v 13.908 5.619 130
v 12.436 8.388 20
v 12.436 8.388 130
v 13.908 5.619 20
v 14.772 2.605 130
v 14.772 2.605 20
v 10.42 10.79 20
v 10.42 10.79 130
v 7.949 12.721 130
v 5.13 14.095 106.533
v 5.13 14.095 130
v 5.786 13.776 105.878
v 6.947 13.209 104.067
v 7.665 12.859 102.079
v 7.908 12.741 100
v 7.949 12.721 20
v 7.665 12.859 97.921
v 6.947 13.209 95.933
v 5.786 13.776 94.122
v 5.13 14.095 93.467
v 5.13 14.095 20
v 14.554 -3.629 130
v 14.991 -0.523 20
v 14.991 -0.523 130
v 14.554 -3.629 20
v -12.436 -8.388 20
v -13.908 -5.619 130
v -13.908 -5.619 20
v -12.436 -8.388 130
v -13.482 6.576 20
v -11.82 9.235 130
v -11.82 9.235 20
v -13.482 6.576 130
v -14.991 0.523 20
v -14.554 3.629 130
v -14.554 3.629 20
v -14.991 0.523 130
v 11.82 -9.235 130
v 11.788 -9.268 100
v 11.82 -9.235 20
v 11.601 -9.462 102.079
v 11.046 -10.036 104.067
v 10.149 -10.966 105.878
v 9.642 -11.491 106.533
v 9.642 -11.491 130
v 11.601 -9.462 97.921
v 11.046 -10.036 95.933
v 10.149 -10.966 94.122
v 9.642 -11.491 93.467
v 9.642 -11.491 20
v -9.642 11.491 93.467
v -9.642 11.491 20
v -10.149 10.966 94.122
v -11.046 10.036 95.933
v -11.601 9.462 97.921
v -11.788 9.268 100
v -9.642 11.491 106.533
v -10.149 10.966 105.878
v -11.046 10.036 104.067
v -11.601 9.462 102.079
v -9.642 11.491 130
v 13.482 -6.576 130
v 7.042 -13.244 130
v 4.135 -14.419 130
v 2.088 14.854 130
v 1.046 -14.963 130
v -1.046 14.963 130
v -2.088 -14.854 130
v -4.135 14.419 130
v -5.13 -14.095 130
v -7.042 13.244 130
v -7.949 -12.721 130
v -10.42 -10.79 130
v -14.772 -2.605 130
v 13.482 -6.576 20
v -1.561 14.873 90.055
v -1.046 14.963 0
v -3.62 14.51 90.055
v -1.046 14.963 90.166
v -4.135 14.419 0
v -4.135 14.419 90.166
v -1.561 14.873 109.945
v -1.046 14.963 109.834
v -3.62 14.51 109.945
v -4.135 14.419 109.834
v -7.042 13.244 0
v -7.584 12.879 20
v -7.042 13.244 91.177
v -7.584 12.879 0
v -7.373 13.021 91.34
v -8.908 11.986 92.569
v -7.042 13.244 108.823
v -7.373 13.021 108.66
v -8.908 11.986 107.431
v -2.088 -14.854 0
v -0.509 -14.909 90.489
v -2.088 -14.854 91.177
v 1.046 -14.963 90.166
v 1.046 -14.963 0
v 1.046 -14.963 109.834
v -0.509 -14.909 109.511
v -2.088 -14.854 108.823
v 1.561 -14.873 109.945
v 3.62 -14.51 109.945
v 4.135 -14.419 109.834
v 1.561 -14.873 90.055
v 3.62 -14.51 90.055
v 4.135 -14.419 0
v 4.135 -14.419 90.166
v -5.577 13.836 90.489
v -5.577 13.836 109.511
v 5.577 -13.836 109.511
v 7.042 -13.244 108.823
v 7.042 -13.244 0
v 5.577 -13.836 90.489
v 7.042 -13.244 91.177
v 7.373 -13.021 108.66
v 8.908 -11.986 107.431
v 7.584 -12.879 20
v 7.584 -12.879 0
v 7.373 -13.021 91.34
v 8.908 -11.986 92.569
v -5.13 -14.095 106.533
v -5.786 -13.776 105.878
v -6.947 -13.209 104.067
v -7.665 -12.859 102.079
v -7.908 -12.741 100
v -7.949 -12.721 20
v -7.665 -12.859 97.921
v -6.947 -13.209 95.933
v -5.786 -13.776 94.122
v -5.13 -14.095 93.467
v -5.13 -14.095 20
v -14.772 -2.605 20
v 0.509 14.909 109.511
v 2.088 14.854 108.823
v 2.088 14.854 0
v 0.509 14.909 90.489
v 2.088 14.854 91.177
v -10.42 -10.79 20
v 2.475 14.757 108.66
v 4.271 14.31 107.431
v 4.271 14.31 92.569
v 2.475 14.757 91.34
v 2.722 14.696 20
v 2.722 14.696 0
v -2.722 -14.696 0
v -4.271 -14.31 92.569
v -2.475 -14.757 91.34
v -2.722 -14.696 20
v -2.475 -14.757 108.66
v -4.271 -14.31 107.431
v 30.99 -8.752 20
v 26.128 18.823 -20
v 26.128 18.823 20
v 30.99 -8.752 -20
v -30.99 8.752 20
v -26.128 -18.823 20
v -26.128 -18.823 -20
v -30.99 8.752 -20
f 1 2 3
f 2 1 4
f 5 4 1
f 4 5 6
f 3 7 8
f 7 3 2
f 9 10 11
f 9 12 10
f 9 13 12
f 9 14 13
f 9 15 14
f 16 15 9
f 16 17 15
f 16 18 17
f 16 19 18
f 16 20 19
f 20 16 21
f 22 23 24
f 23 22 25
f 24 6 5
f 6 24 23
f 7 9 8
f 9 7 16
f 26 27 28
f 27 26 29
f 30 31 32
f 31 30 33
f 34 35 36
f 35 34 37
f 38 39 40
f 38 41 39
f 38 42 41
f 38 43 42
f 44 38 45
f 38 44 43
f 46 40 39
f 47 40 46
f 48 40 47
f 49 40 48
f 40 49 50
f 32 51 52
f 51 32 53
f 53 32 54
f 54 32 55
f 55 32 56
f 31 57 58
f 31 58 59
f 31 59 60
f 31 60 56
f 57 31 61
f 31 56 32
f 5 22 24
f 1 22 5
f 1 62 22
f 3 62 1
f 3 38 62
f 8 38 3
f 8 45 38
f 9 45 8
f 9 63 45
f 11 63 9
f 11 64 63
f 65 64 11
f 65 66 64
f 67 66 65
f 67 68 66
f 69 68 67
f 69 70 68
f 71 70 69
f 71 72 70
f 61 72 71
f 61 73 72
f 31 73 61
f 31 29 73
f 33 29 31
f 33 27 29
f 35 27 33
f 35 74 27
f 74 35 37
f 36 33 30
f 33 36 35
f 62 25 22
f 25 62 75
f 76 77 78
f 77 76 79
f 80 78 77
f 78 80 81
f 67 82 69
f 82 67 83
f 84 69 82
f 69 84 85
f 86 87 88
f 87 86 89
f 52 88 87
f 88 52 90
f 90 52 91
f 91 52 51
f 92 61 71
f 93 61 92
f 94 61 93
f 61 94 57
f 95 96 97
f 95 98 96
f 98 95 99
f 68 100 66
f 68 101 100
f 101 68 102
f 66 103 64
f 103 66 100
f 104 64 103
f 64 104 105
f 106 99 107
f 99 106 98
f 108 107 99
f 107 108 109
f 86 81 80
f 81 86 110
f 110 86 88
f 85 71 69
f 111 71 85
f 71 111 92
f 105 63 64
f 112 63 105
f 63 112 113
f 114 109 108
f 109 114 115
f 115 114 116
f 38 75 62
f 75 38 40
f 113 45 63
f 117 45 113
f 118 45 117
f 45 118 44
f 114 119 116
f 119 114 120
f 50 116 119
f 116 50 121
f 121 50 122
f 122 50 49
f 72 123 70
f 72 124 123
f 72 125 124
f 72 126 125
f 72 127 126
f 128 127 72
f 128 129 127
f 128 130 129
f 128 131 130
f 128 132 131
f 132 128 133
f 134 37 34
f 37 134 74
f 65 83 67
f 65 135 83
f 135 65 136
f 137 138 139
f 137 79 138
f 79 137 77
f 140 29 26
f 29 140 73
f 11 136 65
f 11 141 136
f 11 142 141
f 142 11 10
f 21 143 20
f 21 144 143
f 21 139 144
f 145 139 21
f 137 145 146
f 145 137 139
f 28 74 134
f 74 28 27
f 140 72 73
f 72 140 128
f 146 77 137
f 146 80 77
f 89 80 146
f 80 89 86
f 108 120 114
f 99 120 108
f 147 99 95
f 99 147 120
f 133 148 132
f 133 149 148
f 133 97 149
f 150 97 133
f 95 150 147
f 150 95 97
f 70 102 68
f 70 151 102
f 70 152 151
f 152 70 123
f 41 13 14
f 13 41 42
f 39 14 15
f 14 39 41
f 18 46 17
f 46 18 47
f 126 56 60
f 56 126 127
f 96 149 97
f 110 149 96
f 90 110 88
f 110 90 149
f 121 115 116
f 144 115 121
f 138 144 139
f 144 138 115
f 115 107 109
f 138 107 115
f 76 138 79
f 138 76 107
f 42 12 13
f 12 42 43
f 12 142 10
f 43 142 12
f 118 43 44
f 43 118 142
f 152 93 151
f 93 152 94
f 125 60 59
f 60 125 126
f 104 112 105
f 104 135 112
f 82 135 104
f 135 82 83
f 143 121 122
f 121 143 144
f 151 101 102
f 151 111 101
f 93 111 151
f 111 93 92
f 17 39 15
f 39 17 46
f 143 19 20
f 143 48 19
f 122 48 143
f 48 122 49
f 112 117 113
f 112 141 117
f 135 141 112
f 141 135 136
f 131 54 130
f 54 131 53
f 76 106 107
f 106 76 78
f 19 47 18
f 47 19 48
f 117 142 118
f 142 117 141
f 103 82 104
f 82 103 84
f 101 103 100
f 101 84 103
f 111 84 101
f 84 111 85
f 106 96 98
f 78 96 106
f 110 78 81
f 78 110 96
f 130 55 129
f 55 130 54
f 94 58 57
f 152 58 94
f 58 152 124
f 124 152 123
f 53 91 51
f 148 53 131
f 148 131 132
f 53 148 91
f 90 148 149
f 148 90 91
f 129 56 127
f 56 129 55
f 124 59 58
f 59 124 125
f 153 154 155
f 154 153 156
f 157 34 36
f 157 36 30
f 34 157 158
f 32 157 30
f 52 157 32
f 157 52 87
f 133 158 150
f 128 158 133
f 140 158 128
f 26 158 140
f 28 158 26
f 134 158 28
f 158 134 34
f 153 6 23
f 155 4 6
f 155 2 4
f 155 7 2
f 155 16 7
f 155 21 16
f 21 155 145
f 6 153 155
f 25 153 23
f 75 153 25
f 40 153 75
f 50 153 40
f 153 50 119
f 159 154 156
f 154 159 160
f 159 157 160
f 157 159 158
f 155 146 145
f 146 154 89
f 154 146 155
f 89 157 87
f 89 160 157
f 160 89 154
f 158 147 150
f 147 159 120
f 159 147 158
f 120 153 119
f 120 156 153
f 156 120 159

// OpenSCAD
l=130;
h_l=58;
h_w=28;
h_h=40;



module hammer(){
/* rotate([60, 20, 10]) { */

	color("grey")
	cube([h_l,h_w,h_h],true);
	rotate([0,0,0])
	difference() {
		cylinder(r=15, h=l);
		translate([0, 0, 100])
		rotate([90, 0, 0]) {
			cylinder(r=10, h=100, center=true);

		}
	}

/* } */

}


rotate([0, 0, 10]) {
	hammer();
}
